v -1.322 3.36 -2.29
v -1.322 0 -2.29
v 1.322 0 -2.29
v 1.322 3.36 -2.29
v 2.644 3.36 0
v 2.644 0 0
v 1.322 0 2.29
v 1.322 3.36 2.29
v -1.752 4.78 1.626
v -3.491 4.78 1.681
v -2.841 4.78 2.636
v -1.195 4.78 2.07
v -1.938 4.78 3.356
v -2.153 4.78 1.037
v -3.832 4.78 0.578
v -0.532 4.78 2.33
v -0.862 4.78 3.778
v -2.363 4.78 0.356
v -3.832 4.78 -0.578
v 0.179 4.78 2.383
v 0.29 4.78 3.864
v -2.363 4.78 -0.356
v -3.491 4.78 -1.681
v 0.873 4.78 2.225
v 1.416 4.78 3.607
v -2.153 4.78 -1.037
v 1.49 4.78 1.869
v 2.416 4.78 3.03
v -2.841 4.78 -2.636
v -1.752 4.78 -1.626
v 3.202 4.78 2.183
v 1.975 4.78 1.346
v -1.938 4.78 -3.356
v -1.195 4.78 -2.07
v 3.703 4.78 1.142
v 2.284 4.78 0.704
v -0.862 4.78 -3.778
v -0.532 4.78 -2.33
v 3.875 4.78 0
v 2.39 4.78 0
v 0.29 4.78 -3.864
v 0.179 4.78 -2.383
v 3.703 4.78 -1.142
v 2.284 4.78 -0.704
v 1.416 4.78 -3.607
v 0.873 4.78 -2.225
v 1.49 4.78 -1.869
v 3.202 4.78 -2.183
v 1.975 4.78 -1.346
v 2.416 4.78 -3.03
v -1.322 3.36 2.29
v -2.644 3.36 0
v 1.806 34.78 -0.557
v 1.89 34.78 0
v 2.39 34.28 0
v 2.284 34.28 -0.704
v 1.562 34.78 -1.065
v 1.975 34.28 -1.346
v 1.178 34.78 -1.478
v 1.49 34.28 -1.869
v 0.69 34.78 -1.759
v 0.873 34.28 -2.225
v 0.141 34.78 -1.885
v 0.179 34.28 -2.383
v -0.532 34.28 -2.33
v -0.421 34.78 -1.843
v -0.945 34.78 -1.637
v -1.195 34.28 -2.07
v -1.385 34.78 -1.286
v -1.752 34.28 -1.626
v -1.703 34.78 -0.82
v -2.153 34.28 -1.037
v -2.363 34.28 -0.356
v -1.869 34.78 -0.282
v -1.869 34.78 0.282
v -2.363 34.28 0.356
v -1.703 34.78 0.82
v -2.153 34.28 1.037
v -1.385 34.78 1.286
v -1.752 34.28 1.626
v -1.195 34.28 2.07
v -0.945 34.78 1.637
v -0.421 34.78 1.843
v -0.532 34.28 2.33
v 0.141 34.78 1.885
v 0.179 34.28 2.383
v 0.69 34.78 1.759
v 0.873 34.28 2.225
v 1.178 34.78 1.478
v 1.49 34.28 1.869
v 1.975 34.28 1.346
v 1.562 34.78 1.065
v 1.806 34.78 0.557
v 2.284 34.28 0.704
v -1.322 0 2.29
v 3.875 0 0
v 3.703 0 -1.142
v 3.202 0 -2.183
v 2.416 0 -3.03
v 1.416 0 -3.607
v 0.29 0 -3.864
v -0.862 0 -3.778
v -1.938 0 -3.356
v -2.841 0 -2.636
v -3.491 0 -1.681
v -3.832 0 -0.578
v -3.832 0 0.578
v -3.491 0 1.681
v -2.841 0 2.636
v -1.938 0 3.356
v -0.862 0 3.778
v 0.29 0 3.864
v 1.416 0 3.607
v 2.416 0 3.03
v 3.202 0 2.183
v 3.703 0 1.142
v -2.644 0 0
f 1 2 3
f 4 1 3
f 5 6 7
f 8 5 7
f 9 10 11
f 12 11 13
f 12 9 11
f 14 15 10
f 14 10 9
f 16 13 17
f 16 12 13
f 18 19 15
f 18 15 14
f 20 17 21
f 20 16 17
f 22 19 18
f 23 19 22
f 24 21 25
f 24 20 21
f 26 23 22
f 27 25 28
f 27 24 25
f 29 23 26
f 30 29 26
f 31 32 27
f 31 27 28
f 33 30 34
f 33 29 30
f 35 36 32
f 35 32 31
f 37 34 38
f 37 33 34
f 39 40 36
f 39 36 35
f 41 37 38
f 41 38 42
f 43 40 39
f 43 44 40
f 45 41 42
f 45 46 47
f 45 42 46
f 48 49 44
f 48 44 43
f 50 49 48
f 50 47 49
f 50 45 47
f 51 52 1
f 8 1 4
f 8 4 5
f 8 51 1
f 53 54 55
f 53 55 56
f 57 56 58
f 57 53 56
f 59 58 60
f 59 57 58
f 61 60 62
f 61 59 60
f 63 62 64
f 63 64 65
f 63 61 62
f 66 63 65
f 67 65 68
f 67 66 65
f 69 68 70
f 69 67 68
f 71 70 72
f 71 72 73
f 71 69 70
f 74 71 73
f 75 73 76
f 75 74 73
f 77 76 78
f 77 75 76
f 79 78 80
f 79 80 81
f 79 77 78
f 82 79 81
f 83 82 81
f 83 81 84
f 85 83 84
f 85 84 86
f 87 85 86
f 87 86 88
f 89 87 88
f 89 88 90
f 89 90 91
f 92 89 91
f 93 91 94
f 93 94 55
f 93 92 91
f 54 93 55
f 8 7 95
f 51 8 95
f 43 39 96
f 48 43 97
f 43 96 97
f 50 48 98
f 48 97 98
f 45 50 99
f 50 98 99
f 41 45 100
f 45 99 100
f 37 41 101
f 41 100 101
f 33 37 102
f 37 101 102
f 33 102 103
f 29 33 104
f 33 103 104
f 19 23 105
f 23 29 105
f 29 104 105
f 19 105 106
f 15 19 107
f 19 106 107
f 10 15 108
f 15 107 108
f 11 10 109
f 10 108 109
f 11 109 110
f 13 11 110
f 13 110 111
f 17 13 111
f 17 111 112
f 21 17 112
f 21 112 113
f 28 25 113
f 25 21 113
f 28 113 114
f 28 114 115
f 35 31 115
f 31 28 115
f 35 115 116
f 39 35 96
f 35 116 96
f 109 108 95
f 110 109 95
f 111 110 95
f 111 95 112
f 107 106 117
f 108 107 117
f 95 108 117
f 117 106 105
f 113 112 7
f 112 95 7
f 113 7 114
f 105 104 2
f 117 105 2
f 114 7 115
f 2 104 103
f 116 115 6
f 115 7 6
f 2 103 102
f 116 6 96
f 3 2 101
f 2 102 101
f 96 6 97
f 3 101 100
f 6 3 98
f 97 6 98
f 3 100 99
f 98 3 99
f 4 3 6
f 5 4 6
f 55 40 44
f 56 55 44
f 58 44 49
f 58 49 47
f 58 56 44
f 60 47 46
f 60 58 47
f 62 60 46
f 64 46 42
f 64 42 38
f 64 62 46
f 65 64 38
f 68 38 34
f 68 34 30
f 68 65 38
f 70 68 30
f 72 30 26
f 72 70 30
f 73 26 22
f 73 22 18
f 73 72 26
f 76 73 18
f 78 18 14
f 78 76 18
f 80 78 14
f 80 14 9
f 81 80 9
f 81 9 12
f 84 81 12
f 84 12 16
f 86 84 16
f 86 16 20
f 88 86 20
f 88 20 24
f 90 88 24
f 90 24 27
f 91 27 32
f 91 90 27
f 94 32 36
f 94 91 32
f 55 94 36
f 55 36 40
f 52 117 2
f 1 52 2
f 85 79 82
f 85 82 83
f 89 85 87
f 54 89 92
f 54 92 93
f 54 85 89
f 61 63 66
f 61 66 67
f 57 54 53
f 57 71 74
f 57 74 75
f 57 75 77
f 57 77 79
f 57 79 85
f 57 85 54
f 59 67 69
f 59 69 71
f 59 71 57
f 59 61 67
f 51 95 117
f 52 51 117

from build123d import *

# Parameters (mm, degrees)
SKETCH1_R           = 3.875
BOSS_EXTRUDE1_DEPTH = 34.78
SKETCH2_OUTSIDE_W   = 17.044
SKETCH2_OUTSIDE_H   = 17.044
SKETCH2_OUTSIDE_R   = 2.39
CUT_EXTRUDE1_DEPTH  = 30
CHAMFER1_SIZE       = 0.5
CUT_EXTRUDE2_DEPTH  = 3.36


with BuildPart() as part:
    # Sketch1 → Boss-Extrude1 (new body)
    with BuildSketch(Plane(origin=(0, 0, 0), x_dir=(1, 0, 0), z_dir=(0, 1, 0))):
        Circle(SKETCH1_R)
    extrude(amount=BOSS_EXTRUDE1_DEPTH)

    # Sketch2 outside → Cut-Extrude1 (cut)
    with BuildSketch(Plane(origin=(0, 34.78, 0), x_dir=(1, 0, 0), z_dir=(0, 1, 0))):
        Rectangle(SKETCH2_OUTSIDE_W, SKETCH2_OUTSIDE_H)
        Circle(SKETCH2_OUTSIDE_R, mode=Mode.SUBTRACT)
    extrude(amount=-CUT_EXTRUDE1_DEPTH, mode=Mode.SUBTRACT)

    # Chamfer1
    chamfer1_edges = [part.edges().sort_by_distance(p)[0] for p in [
        (-2.39, 34.78, 0),
    ]]
    chamfer(chamfer1_edges, length=CHAMFER1_SIZE)

    # Sketch8 → Cut-Extrude2 (cut)
    with BuildSketch(Plane.XZ):
        Polygon((2.644264233, 0), (1.322132116, 2.29), (-1.322132116, 2.29), (-2.644264233, 0), (-1.322132116, -2.29), (1.322132116, -2.29), align=None)
    extrude(amount=-CUT_EXTRUDE2_DEPTH, mode=Mode.SUBTRACT)


solid = part.part
